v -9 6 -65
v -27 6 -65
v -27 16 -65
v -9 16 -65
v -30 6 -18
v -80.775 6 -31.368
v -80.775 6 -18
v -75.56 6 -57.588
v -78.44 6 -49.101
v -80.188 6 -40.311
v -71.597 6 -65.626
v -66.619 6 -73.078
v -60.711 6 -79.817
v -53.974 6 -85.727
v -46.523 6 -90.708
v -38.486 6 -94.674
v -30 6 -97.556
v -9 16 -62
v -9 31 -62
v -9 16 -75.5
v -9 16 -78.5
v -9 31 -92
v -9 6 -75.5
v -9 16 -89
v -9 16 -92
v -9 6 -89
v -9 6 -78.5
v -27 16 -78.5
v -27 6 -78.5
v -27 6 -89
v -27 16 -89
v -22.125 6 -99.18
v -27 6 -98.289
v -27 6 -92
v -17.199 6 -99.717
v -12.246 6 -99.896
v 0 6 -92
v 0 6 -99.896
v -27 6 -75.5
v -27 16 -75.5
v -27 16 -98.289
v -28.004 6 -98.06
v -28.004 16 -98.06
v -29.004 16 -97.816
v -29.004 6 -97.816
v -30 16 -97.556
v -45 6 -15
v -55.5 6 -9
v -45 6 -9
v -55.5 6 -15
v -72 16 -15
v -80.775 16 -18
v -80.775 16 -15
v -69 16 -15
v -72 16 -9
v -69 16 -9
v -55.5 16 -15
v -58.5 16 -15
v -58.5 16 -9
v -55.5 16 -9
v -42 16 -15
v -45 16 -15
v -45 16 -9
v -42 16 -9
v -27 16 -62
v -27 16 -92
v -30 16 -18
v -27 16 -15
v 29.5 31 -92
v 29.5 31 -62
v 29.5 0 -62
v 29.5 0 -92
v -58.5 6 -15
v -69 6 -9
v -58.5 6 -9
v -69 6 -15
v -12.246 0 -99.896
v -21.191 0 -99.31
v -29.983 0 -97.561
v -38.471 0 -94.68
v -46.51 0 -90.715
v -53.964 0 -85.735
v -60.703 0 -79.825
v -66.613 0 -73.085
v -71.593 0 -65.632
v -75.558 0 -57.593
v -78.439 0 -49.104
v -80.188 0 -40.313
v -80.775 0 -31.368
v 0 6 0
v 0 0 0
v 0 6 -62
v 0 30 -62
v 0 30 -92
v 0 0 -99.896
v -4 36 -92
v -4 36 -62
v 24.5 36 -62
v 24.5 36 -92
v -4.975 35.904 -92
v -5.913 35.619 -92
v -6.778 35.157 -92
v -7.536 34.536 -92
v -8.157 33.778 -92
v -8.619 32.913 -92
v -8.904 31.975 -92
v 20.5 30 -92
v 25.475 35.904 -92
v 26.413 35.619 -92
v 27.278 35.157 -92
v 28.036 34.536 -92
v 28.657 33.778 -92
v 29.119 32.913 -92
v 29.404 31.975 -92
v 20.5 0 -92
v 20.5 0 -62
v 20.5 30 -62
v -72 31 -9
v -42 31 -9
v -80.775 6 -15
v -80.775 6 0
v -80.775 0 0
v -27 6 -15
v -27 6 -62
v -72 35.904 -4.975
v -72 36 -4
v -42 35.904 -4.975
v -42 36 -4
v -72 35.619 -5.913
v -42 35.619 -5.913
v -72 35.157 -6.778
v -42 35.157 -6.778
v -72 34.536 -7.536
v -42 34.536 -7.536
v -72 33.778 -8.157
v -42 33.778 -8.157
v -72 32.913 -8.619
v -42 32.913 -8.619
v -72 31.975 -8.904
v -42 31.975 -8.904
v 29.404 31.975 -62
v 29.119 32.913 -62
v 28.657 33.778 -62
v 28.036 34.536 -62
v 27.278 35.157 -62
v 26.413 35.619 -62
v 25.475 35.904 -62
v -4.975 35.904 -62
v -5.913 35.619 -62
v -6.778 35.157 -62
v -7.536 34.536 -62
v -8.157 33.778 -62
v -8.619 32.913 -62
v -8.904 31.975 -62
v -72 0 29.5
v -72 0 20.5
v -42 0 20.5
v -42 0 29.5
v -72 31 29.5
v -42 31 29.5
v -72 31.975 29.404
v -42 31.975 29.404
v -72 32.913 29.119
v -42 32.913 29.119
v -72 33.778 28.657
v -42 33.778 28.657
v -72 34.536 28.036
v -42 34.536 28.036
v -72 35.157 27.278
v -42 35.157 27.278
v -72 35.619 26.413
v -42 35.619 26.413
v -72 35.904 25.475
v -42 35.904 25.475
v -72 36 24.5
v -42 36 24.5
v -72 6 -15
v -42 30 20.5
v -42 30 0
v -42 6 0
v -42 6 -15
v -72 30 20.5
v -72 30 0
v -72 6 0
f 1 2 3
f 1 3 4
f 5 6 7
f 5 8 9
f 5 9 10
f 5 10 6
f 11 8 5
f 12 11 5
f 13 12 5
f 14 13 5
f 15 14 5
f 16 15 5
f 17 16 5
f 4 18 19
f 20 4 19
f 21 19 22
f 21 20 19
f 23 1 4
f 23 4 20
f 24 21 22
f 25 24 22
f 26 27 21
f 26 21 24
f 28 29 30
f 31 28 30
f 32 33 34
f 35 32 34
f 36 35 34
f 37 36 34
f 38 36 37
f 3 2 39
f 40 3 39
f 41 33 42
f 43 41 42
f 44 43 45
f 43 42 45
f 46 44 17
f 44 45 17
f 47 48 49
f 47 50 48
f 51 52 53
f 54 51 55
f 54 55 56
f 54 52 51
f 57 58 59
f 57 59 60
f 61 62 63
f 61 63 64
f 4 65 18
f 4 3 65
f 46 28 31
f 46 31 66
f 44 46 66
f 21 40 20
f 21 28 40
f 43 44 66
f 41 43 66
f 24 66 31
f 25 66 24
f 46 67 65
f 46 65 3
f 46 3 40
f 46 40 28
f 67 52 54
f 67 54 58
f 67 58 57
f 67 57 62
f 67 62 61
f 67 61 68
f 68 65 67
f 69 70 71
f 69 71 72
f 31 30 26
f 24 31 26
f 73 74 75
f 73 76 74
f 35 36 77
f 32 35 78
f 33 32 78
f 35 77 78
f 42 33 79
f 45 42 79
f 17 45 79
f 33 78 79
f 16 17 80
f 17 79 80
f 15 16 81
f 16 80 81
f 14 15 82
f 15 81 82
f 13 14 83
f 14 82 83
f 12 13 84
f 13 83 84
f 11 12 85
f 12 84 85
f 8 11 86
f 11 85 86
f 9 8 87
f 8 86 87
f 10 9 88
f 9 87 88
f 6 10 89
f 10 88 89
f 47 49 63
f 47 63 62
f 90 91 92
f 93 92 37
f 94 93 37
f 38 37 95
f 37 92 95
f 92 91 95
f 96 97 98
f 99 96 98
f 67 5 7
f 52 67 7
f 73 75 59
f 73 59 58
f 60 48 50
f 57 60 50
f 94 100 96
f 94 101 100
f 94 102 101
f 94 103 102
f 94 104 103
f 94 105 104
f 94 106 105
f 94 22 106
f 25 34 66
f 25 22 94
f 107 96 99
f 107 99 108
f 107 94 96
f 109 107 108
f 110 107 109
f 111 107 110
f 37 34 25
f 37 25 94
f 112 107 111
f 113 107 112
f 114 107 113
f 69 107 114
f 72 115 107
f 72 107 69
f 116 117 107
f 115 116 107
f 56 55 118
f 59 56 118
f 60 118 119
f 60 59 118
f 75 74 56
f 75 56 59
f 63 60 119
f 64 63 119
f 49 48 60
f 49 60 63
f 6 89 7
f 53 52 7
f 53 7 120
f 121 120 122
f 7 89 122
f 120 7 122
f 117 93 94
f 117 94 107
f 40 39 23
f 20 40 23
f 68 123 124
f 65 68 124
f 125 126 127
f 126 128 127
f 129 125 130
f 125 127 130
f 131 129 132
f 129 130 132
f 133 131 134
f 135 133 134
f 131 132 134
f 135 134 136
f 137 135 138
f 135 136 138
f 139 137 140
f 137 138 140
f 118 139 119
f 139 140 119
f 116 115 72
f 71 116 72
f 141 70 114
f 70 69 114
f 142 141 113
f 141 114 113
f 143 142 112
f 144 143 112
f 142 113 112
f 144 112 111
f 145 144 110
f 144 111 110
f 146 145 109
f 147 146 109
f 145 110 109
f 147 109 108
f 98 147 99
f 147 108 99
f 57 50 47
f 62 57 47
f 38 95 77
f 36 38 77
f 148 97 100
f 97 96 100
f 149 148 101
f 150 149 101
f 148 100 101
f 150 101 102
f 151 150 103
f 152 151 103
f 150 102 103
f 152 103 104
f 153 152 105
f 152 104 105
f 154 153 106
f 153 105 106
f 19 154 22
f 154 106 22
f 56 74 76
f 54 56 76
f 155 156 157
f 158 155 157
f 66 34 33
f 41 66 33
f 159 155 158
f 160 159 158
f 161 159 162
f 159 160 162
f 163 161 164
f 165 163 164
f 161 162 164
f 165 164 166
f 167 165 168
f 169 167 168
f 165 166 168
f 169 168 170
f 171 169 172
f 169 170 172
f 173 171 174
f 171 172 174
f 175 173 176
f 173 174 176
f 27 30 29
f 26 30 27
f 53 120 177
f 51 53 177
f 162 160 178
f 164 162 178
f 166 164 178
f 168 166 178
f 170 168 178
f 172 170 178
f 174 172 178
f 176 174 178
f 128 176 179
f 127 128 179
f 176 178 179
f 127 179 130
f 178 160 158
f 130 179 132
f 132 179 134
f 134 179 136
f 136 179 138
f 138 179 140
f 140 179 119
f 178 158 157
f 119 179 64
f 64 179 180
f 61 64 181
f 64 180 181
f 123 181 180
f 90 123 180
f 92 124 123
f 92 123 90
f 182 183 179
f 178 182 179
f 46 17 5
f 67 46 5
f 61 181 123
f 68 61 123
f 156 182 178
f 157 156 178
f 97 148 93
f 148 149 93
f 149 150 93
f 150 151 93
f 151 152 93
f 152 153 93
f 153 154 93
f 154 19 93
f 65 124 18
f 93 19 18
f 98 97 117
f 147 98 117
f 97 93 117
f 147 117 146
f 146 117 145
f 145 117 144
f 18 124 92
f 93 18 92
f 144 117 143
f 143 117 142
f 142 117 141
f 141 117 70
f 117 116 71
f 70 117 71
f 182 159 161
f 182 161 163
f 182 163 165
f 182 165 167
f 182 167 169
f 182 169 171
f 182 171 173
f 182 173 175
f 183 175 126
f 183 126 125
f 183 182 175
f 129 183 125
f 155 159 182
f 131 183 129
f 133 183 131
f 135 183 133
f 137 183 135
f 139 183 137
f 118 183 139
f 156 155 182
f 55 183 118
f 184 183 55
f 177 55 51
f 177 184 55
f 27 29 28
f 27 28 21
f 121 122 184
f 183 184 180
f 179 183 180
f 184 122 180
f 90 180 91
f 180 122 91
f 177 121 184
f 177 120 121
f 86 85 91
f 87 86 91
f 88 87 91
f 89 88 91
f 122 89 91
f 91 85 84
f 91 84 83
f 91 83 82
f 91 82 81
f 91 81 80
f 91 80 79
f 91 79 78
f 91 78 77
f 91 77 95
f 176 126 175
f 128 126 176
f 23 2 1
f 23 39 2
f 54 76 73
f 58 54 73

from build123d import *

# Parameters (mm, degrees)
SKETCH1_W           = 30
SKETCH1_H           = 9
SKETCH1_W_2         = 9
SKETCH1_H_2         = 30
BOSS_EXTRUDE1_DEPTH = 6
BOSS_EXTRUDE2_START = 6
SKETCH1_3_W         = 30
SKETCH1_3_H         = 9
SKETCH1_3_W_2       = 9
SKETCH1_3_H_2       = 30
BOSS_EXTRUDE2_DEPTH = 24
BOSS_EXTRUDE3_START = 30
SKETCH1_4_W         = 30
SKETCH1_4_H         = 9
SKETCH1_4_H_2       = 20.5
SKETCH1_4_W_2       = 9
SKETCH1_4_H_3       = 30
SKETCH1_4_W_3       = 20.5
BOSS_EXTRUDE3_DEPTH = 6
BOSS_EXTRUDE4_START = 30
SKETCH1_5_W         = 30
SKETCH1_5_H         = 9
SKETCH1_5_W_2       = 9
SKETCH1_5_H_2       = 30
BOSS_EXTRUDE4_DEPTH = 30
SKETCH2_W           = 3
SKETCH2_H           = 6
SKETCH2_W_2         = 18
SKETCH2_H_2         = 3
BOSS_EXTRUDE5_DEPTH = 10
FILLET1_R           = 5


with BuildPart() as part:
    # Sketch1 → Boss-Extrude1 (new body)
    with BuildSketch(Plane(origin=(0, 0, 0), x_dir=(1, 0, 0), z_dir=(0, 1, 0))):
        with Locations((-57, 4.5)):
            Rectangle(SKETCH1_W, SKETCH1_H)
        with Locations((-4.5, 77)):
            Rectangle(SKETCH1_W_2, SKETCH1_H_2)
        with BuildLine():
            Line((0, 99.896112213), (-12.24628833, 99.896112213))
            ThreePointArc((-12.24628833, 99.896112213), (-60.703064532, 79.824658322), (-80.774518424, 31.36788212))
            Line((-80.774518424, 31.36788212), (-80.774518424, 0))
            Line((-80.774518424, 0), (-72, 0))
            Line((-72, 0), (-72, 9))
            Line((-72, 9), (-42, 9))
            Line((-42, 9), (-42, 0))
            Line((-42, 0), (0, 0))
            Line((0, 0), (0, 62))
            Line((0, 62), (-9, 62))
            Line((-9, 62), (-9, 92))
            Line((-9, 92), (0, 92))
            Line((0, 92), (0, 99.896112213))
        make_face()
    extrude(amount=BOSS_EXTRUDE1_DEPTH)

    # Sketch1<3> → Boss-Extrude2 (add)
    with BuildSketch(Plane(origin=(0, 0, 0), x_dir=(1, 0, 0), z_dir=(0, 1, 0)).offset(BOSS_EXTRUDE2_START)):
        with Locations((-57, 4.5)):
            Rectangle(SKETCH1_3_W, SKETCH1_3_H)
        with Locations((-4.5, 77)):
            Rectangle(SKETCH1_3_W_2, SKETCH1_3_H_2)
    extrude(amount=BOSS_EXTRUDE2_DEPTH)

    # Sketch1<4> → Boss-Extrude3 (add)
    with BuildSketch(Plane(origin=(0, 0, 0), x_dir=(1, 0, 0), z_dir=(0, 1, 0)).offset(BOSS_EXTRUDE3_START)):
        with Locations((-57, 4.5)):
            Rectangle(SKETCH1_4_W, SKETCH1_4_H)
        with Locations((-57, -10.25)):
            Rectangle(SKETCH1_4_W, SKETCH1_4_H_2)
        with Locations((-57, -25)):
            Rectangle(SKETCH1_4_W, SKETCH1_4_H)
        with Locations((-4.5, 77)):
            Rectangle(SKETCH1_4_W_2, SKETCH1_4_H_3)
        with Locations((10.25, 77)):
            Rectangle(SKETCH1_4_W_3, SKETCH1_4_H_3)
        with Locations((25, 77)):
            Rectangle(SKETCH1_4_W_2, SKETCH1_4_H_3)
    extrude(amount=BOSS_EXTRUDE3_DEPTH)

    # Sketch1<5> → Boss-Extrude4 (add)
    with BuildSketch(Plane(origin=(0, 0, 0), x_dir=(1, 0, 0), z_dir=(0, 1, 0)).offset(BOSS_EXTRUDE4_START)):
        with Locations((-57, -25)):
            Rectangle(SKETCH1_5_W, SKETCH1_5_H)
        with Locations((25, 77)):
            Rectangle(SKETCH1_5_W_2, SKETCH1_5_H_2)
    extrude(amount=-BOSS_EXTRUDE4_DEPTH)

    # Sketch2 → Boss-Extrude5 (add)
    with BuildSketch(Plane(origin=(0, 6, 0), x_dir=(1, 0, 0), z_dir=(0, 1, 0))):
        with BuildLine():
            Line((-27, 89), (-27, 92))
            Line((-27, 92), (-27, 98.289076907))
            ThreePointArc((-27, 98.289076907), (-28.50412753, 97.9396553), (-30, 97.556431293))
            Line((-30, 97.556431293), (-30, 18))
            Line((-30, 18), (-80.774518424, 18))
            Line((-80.774518424, 18), (-80.774518424, 15))
            Line((-80.774518424, 15), (-72, 15))
            Line((-72, 15), (-69, 15))
            Line((-69, 15), (-58.5, 15))
            Line((-58.5, 15), (-55.5, 15))
            Line((-55.5, 15), (-45, 15))
            Line((-45, 15), (-42, 15))
            Line((-42, 15), (-27, 15))
            Line((-27, 15), (-27, 62))
            Line((-27, 62), (-27, 65))
            Line((-27, 65), (-27, 75.5))
            Line((-27, 75.5), (-27, 78.5))
            Line((-27, 78.5), (-27, 89))
        make_face()
        with Locations((-57, 12)):
            Rectangle(SKETCH2_W, SKETCH2_H)
        with Locations((-18, 77)):
            Rectangle(SKETCH2_W_2, SKETCH2_H_2)
        with Locations((-70.5, 12)):
            Rectangle(SKETCH2_W, SKETCH2_H)
        with Locations((-43.5, 12)):
            Rectangle(SKETCH2_W, SKETCH2_H)
        with Locations((-18, 63.5)):
            Rectangle(SKETCH2_W_2, SKETCH2_H_2)
        with Locations((-18, 90.5)):
            Rectangle(SKETCH2_W_2, SKETCH2_H_2)
    extrude(amount=BOSS_EXTRUDE5_DEPTH)

    # Fillet1
    fillet1_edges = [part.edges().sort_by_distance(p)[0] for p in [
        (-57, 36, -9),
        (-57, 36, 29.5),
        (29.5, 36, -77),
        (-9, 36, -77),
    ]]
    fillet(fillet1_edges, radius=FILLET1_R)


solid = part.part
